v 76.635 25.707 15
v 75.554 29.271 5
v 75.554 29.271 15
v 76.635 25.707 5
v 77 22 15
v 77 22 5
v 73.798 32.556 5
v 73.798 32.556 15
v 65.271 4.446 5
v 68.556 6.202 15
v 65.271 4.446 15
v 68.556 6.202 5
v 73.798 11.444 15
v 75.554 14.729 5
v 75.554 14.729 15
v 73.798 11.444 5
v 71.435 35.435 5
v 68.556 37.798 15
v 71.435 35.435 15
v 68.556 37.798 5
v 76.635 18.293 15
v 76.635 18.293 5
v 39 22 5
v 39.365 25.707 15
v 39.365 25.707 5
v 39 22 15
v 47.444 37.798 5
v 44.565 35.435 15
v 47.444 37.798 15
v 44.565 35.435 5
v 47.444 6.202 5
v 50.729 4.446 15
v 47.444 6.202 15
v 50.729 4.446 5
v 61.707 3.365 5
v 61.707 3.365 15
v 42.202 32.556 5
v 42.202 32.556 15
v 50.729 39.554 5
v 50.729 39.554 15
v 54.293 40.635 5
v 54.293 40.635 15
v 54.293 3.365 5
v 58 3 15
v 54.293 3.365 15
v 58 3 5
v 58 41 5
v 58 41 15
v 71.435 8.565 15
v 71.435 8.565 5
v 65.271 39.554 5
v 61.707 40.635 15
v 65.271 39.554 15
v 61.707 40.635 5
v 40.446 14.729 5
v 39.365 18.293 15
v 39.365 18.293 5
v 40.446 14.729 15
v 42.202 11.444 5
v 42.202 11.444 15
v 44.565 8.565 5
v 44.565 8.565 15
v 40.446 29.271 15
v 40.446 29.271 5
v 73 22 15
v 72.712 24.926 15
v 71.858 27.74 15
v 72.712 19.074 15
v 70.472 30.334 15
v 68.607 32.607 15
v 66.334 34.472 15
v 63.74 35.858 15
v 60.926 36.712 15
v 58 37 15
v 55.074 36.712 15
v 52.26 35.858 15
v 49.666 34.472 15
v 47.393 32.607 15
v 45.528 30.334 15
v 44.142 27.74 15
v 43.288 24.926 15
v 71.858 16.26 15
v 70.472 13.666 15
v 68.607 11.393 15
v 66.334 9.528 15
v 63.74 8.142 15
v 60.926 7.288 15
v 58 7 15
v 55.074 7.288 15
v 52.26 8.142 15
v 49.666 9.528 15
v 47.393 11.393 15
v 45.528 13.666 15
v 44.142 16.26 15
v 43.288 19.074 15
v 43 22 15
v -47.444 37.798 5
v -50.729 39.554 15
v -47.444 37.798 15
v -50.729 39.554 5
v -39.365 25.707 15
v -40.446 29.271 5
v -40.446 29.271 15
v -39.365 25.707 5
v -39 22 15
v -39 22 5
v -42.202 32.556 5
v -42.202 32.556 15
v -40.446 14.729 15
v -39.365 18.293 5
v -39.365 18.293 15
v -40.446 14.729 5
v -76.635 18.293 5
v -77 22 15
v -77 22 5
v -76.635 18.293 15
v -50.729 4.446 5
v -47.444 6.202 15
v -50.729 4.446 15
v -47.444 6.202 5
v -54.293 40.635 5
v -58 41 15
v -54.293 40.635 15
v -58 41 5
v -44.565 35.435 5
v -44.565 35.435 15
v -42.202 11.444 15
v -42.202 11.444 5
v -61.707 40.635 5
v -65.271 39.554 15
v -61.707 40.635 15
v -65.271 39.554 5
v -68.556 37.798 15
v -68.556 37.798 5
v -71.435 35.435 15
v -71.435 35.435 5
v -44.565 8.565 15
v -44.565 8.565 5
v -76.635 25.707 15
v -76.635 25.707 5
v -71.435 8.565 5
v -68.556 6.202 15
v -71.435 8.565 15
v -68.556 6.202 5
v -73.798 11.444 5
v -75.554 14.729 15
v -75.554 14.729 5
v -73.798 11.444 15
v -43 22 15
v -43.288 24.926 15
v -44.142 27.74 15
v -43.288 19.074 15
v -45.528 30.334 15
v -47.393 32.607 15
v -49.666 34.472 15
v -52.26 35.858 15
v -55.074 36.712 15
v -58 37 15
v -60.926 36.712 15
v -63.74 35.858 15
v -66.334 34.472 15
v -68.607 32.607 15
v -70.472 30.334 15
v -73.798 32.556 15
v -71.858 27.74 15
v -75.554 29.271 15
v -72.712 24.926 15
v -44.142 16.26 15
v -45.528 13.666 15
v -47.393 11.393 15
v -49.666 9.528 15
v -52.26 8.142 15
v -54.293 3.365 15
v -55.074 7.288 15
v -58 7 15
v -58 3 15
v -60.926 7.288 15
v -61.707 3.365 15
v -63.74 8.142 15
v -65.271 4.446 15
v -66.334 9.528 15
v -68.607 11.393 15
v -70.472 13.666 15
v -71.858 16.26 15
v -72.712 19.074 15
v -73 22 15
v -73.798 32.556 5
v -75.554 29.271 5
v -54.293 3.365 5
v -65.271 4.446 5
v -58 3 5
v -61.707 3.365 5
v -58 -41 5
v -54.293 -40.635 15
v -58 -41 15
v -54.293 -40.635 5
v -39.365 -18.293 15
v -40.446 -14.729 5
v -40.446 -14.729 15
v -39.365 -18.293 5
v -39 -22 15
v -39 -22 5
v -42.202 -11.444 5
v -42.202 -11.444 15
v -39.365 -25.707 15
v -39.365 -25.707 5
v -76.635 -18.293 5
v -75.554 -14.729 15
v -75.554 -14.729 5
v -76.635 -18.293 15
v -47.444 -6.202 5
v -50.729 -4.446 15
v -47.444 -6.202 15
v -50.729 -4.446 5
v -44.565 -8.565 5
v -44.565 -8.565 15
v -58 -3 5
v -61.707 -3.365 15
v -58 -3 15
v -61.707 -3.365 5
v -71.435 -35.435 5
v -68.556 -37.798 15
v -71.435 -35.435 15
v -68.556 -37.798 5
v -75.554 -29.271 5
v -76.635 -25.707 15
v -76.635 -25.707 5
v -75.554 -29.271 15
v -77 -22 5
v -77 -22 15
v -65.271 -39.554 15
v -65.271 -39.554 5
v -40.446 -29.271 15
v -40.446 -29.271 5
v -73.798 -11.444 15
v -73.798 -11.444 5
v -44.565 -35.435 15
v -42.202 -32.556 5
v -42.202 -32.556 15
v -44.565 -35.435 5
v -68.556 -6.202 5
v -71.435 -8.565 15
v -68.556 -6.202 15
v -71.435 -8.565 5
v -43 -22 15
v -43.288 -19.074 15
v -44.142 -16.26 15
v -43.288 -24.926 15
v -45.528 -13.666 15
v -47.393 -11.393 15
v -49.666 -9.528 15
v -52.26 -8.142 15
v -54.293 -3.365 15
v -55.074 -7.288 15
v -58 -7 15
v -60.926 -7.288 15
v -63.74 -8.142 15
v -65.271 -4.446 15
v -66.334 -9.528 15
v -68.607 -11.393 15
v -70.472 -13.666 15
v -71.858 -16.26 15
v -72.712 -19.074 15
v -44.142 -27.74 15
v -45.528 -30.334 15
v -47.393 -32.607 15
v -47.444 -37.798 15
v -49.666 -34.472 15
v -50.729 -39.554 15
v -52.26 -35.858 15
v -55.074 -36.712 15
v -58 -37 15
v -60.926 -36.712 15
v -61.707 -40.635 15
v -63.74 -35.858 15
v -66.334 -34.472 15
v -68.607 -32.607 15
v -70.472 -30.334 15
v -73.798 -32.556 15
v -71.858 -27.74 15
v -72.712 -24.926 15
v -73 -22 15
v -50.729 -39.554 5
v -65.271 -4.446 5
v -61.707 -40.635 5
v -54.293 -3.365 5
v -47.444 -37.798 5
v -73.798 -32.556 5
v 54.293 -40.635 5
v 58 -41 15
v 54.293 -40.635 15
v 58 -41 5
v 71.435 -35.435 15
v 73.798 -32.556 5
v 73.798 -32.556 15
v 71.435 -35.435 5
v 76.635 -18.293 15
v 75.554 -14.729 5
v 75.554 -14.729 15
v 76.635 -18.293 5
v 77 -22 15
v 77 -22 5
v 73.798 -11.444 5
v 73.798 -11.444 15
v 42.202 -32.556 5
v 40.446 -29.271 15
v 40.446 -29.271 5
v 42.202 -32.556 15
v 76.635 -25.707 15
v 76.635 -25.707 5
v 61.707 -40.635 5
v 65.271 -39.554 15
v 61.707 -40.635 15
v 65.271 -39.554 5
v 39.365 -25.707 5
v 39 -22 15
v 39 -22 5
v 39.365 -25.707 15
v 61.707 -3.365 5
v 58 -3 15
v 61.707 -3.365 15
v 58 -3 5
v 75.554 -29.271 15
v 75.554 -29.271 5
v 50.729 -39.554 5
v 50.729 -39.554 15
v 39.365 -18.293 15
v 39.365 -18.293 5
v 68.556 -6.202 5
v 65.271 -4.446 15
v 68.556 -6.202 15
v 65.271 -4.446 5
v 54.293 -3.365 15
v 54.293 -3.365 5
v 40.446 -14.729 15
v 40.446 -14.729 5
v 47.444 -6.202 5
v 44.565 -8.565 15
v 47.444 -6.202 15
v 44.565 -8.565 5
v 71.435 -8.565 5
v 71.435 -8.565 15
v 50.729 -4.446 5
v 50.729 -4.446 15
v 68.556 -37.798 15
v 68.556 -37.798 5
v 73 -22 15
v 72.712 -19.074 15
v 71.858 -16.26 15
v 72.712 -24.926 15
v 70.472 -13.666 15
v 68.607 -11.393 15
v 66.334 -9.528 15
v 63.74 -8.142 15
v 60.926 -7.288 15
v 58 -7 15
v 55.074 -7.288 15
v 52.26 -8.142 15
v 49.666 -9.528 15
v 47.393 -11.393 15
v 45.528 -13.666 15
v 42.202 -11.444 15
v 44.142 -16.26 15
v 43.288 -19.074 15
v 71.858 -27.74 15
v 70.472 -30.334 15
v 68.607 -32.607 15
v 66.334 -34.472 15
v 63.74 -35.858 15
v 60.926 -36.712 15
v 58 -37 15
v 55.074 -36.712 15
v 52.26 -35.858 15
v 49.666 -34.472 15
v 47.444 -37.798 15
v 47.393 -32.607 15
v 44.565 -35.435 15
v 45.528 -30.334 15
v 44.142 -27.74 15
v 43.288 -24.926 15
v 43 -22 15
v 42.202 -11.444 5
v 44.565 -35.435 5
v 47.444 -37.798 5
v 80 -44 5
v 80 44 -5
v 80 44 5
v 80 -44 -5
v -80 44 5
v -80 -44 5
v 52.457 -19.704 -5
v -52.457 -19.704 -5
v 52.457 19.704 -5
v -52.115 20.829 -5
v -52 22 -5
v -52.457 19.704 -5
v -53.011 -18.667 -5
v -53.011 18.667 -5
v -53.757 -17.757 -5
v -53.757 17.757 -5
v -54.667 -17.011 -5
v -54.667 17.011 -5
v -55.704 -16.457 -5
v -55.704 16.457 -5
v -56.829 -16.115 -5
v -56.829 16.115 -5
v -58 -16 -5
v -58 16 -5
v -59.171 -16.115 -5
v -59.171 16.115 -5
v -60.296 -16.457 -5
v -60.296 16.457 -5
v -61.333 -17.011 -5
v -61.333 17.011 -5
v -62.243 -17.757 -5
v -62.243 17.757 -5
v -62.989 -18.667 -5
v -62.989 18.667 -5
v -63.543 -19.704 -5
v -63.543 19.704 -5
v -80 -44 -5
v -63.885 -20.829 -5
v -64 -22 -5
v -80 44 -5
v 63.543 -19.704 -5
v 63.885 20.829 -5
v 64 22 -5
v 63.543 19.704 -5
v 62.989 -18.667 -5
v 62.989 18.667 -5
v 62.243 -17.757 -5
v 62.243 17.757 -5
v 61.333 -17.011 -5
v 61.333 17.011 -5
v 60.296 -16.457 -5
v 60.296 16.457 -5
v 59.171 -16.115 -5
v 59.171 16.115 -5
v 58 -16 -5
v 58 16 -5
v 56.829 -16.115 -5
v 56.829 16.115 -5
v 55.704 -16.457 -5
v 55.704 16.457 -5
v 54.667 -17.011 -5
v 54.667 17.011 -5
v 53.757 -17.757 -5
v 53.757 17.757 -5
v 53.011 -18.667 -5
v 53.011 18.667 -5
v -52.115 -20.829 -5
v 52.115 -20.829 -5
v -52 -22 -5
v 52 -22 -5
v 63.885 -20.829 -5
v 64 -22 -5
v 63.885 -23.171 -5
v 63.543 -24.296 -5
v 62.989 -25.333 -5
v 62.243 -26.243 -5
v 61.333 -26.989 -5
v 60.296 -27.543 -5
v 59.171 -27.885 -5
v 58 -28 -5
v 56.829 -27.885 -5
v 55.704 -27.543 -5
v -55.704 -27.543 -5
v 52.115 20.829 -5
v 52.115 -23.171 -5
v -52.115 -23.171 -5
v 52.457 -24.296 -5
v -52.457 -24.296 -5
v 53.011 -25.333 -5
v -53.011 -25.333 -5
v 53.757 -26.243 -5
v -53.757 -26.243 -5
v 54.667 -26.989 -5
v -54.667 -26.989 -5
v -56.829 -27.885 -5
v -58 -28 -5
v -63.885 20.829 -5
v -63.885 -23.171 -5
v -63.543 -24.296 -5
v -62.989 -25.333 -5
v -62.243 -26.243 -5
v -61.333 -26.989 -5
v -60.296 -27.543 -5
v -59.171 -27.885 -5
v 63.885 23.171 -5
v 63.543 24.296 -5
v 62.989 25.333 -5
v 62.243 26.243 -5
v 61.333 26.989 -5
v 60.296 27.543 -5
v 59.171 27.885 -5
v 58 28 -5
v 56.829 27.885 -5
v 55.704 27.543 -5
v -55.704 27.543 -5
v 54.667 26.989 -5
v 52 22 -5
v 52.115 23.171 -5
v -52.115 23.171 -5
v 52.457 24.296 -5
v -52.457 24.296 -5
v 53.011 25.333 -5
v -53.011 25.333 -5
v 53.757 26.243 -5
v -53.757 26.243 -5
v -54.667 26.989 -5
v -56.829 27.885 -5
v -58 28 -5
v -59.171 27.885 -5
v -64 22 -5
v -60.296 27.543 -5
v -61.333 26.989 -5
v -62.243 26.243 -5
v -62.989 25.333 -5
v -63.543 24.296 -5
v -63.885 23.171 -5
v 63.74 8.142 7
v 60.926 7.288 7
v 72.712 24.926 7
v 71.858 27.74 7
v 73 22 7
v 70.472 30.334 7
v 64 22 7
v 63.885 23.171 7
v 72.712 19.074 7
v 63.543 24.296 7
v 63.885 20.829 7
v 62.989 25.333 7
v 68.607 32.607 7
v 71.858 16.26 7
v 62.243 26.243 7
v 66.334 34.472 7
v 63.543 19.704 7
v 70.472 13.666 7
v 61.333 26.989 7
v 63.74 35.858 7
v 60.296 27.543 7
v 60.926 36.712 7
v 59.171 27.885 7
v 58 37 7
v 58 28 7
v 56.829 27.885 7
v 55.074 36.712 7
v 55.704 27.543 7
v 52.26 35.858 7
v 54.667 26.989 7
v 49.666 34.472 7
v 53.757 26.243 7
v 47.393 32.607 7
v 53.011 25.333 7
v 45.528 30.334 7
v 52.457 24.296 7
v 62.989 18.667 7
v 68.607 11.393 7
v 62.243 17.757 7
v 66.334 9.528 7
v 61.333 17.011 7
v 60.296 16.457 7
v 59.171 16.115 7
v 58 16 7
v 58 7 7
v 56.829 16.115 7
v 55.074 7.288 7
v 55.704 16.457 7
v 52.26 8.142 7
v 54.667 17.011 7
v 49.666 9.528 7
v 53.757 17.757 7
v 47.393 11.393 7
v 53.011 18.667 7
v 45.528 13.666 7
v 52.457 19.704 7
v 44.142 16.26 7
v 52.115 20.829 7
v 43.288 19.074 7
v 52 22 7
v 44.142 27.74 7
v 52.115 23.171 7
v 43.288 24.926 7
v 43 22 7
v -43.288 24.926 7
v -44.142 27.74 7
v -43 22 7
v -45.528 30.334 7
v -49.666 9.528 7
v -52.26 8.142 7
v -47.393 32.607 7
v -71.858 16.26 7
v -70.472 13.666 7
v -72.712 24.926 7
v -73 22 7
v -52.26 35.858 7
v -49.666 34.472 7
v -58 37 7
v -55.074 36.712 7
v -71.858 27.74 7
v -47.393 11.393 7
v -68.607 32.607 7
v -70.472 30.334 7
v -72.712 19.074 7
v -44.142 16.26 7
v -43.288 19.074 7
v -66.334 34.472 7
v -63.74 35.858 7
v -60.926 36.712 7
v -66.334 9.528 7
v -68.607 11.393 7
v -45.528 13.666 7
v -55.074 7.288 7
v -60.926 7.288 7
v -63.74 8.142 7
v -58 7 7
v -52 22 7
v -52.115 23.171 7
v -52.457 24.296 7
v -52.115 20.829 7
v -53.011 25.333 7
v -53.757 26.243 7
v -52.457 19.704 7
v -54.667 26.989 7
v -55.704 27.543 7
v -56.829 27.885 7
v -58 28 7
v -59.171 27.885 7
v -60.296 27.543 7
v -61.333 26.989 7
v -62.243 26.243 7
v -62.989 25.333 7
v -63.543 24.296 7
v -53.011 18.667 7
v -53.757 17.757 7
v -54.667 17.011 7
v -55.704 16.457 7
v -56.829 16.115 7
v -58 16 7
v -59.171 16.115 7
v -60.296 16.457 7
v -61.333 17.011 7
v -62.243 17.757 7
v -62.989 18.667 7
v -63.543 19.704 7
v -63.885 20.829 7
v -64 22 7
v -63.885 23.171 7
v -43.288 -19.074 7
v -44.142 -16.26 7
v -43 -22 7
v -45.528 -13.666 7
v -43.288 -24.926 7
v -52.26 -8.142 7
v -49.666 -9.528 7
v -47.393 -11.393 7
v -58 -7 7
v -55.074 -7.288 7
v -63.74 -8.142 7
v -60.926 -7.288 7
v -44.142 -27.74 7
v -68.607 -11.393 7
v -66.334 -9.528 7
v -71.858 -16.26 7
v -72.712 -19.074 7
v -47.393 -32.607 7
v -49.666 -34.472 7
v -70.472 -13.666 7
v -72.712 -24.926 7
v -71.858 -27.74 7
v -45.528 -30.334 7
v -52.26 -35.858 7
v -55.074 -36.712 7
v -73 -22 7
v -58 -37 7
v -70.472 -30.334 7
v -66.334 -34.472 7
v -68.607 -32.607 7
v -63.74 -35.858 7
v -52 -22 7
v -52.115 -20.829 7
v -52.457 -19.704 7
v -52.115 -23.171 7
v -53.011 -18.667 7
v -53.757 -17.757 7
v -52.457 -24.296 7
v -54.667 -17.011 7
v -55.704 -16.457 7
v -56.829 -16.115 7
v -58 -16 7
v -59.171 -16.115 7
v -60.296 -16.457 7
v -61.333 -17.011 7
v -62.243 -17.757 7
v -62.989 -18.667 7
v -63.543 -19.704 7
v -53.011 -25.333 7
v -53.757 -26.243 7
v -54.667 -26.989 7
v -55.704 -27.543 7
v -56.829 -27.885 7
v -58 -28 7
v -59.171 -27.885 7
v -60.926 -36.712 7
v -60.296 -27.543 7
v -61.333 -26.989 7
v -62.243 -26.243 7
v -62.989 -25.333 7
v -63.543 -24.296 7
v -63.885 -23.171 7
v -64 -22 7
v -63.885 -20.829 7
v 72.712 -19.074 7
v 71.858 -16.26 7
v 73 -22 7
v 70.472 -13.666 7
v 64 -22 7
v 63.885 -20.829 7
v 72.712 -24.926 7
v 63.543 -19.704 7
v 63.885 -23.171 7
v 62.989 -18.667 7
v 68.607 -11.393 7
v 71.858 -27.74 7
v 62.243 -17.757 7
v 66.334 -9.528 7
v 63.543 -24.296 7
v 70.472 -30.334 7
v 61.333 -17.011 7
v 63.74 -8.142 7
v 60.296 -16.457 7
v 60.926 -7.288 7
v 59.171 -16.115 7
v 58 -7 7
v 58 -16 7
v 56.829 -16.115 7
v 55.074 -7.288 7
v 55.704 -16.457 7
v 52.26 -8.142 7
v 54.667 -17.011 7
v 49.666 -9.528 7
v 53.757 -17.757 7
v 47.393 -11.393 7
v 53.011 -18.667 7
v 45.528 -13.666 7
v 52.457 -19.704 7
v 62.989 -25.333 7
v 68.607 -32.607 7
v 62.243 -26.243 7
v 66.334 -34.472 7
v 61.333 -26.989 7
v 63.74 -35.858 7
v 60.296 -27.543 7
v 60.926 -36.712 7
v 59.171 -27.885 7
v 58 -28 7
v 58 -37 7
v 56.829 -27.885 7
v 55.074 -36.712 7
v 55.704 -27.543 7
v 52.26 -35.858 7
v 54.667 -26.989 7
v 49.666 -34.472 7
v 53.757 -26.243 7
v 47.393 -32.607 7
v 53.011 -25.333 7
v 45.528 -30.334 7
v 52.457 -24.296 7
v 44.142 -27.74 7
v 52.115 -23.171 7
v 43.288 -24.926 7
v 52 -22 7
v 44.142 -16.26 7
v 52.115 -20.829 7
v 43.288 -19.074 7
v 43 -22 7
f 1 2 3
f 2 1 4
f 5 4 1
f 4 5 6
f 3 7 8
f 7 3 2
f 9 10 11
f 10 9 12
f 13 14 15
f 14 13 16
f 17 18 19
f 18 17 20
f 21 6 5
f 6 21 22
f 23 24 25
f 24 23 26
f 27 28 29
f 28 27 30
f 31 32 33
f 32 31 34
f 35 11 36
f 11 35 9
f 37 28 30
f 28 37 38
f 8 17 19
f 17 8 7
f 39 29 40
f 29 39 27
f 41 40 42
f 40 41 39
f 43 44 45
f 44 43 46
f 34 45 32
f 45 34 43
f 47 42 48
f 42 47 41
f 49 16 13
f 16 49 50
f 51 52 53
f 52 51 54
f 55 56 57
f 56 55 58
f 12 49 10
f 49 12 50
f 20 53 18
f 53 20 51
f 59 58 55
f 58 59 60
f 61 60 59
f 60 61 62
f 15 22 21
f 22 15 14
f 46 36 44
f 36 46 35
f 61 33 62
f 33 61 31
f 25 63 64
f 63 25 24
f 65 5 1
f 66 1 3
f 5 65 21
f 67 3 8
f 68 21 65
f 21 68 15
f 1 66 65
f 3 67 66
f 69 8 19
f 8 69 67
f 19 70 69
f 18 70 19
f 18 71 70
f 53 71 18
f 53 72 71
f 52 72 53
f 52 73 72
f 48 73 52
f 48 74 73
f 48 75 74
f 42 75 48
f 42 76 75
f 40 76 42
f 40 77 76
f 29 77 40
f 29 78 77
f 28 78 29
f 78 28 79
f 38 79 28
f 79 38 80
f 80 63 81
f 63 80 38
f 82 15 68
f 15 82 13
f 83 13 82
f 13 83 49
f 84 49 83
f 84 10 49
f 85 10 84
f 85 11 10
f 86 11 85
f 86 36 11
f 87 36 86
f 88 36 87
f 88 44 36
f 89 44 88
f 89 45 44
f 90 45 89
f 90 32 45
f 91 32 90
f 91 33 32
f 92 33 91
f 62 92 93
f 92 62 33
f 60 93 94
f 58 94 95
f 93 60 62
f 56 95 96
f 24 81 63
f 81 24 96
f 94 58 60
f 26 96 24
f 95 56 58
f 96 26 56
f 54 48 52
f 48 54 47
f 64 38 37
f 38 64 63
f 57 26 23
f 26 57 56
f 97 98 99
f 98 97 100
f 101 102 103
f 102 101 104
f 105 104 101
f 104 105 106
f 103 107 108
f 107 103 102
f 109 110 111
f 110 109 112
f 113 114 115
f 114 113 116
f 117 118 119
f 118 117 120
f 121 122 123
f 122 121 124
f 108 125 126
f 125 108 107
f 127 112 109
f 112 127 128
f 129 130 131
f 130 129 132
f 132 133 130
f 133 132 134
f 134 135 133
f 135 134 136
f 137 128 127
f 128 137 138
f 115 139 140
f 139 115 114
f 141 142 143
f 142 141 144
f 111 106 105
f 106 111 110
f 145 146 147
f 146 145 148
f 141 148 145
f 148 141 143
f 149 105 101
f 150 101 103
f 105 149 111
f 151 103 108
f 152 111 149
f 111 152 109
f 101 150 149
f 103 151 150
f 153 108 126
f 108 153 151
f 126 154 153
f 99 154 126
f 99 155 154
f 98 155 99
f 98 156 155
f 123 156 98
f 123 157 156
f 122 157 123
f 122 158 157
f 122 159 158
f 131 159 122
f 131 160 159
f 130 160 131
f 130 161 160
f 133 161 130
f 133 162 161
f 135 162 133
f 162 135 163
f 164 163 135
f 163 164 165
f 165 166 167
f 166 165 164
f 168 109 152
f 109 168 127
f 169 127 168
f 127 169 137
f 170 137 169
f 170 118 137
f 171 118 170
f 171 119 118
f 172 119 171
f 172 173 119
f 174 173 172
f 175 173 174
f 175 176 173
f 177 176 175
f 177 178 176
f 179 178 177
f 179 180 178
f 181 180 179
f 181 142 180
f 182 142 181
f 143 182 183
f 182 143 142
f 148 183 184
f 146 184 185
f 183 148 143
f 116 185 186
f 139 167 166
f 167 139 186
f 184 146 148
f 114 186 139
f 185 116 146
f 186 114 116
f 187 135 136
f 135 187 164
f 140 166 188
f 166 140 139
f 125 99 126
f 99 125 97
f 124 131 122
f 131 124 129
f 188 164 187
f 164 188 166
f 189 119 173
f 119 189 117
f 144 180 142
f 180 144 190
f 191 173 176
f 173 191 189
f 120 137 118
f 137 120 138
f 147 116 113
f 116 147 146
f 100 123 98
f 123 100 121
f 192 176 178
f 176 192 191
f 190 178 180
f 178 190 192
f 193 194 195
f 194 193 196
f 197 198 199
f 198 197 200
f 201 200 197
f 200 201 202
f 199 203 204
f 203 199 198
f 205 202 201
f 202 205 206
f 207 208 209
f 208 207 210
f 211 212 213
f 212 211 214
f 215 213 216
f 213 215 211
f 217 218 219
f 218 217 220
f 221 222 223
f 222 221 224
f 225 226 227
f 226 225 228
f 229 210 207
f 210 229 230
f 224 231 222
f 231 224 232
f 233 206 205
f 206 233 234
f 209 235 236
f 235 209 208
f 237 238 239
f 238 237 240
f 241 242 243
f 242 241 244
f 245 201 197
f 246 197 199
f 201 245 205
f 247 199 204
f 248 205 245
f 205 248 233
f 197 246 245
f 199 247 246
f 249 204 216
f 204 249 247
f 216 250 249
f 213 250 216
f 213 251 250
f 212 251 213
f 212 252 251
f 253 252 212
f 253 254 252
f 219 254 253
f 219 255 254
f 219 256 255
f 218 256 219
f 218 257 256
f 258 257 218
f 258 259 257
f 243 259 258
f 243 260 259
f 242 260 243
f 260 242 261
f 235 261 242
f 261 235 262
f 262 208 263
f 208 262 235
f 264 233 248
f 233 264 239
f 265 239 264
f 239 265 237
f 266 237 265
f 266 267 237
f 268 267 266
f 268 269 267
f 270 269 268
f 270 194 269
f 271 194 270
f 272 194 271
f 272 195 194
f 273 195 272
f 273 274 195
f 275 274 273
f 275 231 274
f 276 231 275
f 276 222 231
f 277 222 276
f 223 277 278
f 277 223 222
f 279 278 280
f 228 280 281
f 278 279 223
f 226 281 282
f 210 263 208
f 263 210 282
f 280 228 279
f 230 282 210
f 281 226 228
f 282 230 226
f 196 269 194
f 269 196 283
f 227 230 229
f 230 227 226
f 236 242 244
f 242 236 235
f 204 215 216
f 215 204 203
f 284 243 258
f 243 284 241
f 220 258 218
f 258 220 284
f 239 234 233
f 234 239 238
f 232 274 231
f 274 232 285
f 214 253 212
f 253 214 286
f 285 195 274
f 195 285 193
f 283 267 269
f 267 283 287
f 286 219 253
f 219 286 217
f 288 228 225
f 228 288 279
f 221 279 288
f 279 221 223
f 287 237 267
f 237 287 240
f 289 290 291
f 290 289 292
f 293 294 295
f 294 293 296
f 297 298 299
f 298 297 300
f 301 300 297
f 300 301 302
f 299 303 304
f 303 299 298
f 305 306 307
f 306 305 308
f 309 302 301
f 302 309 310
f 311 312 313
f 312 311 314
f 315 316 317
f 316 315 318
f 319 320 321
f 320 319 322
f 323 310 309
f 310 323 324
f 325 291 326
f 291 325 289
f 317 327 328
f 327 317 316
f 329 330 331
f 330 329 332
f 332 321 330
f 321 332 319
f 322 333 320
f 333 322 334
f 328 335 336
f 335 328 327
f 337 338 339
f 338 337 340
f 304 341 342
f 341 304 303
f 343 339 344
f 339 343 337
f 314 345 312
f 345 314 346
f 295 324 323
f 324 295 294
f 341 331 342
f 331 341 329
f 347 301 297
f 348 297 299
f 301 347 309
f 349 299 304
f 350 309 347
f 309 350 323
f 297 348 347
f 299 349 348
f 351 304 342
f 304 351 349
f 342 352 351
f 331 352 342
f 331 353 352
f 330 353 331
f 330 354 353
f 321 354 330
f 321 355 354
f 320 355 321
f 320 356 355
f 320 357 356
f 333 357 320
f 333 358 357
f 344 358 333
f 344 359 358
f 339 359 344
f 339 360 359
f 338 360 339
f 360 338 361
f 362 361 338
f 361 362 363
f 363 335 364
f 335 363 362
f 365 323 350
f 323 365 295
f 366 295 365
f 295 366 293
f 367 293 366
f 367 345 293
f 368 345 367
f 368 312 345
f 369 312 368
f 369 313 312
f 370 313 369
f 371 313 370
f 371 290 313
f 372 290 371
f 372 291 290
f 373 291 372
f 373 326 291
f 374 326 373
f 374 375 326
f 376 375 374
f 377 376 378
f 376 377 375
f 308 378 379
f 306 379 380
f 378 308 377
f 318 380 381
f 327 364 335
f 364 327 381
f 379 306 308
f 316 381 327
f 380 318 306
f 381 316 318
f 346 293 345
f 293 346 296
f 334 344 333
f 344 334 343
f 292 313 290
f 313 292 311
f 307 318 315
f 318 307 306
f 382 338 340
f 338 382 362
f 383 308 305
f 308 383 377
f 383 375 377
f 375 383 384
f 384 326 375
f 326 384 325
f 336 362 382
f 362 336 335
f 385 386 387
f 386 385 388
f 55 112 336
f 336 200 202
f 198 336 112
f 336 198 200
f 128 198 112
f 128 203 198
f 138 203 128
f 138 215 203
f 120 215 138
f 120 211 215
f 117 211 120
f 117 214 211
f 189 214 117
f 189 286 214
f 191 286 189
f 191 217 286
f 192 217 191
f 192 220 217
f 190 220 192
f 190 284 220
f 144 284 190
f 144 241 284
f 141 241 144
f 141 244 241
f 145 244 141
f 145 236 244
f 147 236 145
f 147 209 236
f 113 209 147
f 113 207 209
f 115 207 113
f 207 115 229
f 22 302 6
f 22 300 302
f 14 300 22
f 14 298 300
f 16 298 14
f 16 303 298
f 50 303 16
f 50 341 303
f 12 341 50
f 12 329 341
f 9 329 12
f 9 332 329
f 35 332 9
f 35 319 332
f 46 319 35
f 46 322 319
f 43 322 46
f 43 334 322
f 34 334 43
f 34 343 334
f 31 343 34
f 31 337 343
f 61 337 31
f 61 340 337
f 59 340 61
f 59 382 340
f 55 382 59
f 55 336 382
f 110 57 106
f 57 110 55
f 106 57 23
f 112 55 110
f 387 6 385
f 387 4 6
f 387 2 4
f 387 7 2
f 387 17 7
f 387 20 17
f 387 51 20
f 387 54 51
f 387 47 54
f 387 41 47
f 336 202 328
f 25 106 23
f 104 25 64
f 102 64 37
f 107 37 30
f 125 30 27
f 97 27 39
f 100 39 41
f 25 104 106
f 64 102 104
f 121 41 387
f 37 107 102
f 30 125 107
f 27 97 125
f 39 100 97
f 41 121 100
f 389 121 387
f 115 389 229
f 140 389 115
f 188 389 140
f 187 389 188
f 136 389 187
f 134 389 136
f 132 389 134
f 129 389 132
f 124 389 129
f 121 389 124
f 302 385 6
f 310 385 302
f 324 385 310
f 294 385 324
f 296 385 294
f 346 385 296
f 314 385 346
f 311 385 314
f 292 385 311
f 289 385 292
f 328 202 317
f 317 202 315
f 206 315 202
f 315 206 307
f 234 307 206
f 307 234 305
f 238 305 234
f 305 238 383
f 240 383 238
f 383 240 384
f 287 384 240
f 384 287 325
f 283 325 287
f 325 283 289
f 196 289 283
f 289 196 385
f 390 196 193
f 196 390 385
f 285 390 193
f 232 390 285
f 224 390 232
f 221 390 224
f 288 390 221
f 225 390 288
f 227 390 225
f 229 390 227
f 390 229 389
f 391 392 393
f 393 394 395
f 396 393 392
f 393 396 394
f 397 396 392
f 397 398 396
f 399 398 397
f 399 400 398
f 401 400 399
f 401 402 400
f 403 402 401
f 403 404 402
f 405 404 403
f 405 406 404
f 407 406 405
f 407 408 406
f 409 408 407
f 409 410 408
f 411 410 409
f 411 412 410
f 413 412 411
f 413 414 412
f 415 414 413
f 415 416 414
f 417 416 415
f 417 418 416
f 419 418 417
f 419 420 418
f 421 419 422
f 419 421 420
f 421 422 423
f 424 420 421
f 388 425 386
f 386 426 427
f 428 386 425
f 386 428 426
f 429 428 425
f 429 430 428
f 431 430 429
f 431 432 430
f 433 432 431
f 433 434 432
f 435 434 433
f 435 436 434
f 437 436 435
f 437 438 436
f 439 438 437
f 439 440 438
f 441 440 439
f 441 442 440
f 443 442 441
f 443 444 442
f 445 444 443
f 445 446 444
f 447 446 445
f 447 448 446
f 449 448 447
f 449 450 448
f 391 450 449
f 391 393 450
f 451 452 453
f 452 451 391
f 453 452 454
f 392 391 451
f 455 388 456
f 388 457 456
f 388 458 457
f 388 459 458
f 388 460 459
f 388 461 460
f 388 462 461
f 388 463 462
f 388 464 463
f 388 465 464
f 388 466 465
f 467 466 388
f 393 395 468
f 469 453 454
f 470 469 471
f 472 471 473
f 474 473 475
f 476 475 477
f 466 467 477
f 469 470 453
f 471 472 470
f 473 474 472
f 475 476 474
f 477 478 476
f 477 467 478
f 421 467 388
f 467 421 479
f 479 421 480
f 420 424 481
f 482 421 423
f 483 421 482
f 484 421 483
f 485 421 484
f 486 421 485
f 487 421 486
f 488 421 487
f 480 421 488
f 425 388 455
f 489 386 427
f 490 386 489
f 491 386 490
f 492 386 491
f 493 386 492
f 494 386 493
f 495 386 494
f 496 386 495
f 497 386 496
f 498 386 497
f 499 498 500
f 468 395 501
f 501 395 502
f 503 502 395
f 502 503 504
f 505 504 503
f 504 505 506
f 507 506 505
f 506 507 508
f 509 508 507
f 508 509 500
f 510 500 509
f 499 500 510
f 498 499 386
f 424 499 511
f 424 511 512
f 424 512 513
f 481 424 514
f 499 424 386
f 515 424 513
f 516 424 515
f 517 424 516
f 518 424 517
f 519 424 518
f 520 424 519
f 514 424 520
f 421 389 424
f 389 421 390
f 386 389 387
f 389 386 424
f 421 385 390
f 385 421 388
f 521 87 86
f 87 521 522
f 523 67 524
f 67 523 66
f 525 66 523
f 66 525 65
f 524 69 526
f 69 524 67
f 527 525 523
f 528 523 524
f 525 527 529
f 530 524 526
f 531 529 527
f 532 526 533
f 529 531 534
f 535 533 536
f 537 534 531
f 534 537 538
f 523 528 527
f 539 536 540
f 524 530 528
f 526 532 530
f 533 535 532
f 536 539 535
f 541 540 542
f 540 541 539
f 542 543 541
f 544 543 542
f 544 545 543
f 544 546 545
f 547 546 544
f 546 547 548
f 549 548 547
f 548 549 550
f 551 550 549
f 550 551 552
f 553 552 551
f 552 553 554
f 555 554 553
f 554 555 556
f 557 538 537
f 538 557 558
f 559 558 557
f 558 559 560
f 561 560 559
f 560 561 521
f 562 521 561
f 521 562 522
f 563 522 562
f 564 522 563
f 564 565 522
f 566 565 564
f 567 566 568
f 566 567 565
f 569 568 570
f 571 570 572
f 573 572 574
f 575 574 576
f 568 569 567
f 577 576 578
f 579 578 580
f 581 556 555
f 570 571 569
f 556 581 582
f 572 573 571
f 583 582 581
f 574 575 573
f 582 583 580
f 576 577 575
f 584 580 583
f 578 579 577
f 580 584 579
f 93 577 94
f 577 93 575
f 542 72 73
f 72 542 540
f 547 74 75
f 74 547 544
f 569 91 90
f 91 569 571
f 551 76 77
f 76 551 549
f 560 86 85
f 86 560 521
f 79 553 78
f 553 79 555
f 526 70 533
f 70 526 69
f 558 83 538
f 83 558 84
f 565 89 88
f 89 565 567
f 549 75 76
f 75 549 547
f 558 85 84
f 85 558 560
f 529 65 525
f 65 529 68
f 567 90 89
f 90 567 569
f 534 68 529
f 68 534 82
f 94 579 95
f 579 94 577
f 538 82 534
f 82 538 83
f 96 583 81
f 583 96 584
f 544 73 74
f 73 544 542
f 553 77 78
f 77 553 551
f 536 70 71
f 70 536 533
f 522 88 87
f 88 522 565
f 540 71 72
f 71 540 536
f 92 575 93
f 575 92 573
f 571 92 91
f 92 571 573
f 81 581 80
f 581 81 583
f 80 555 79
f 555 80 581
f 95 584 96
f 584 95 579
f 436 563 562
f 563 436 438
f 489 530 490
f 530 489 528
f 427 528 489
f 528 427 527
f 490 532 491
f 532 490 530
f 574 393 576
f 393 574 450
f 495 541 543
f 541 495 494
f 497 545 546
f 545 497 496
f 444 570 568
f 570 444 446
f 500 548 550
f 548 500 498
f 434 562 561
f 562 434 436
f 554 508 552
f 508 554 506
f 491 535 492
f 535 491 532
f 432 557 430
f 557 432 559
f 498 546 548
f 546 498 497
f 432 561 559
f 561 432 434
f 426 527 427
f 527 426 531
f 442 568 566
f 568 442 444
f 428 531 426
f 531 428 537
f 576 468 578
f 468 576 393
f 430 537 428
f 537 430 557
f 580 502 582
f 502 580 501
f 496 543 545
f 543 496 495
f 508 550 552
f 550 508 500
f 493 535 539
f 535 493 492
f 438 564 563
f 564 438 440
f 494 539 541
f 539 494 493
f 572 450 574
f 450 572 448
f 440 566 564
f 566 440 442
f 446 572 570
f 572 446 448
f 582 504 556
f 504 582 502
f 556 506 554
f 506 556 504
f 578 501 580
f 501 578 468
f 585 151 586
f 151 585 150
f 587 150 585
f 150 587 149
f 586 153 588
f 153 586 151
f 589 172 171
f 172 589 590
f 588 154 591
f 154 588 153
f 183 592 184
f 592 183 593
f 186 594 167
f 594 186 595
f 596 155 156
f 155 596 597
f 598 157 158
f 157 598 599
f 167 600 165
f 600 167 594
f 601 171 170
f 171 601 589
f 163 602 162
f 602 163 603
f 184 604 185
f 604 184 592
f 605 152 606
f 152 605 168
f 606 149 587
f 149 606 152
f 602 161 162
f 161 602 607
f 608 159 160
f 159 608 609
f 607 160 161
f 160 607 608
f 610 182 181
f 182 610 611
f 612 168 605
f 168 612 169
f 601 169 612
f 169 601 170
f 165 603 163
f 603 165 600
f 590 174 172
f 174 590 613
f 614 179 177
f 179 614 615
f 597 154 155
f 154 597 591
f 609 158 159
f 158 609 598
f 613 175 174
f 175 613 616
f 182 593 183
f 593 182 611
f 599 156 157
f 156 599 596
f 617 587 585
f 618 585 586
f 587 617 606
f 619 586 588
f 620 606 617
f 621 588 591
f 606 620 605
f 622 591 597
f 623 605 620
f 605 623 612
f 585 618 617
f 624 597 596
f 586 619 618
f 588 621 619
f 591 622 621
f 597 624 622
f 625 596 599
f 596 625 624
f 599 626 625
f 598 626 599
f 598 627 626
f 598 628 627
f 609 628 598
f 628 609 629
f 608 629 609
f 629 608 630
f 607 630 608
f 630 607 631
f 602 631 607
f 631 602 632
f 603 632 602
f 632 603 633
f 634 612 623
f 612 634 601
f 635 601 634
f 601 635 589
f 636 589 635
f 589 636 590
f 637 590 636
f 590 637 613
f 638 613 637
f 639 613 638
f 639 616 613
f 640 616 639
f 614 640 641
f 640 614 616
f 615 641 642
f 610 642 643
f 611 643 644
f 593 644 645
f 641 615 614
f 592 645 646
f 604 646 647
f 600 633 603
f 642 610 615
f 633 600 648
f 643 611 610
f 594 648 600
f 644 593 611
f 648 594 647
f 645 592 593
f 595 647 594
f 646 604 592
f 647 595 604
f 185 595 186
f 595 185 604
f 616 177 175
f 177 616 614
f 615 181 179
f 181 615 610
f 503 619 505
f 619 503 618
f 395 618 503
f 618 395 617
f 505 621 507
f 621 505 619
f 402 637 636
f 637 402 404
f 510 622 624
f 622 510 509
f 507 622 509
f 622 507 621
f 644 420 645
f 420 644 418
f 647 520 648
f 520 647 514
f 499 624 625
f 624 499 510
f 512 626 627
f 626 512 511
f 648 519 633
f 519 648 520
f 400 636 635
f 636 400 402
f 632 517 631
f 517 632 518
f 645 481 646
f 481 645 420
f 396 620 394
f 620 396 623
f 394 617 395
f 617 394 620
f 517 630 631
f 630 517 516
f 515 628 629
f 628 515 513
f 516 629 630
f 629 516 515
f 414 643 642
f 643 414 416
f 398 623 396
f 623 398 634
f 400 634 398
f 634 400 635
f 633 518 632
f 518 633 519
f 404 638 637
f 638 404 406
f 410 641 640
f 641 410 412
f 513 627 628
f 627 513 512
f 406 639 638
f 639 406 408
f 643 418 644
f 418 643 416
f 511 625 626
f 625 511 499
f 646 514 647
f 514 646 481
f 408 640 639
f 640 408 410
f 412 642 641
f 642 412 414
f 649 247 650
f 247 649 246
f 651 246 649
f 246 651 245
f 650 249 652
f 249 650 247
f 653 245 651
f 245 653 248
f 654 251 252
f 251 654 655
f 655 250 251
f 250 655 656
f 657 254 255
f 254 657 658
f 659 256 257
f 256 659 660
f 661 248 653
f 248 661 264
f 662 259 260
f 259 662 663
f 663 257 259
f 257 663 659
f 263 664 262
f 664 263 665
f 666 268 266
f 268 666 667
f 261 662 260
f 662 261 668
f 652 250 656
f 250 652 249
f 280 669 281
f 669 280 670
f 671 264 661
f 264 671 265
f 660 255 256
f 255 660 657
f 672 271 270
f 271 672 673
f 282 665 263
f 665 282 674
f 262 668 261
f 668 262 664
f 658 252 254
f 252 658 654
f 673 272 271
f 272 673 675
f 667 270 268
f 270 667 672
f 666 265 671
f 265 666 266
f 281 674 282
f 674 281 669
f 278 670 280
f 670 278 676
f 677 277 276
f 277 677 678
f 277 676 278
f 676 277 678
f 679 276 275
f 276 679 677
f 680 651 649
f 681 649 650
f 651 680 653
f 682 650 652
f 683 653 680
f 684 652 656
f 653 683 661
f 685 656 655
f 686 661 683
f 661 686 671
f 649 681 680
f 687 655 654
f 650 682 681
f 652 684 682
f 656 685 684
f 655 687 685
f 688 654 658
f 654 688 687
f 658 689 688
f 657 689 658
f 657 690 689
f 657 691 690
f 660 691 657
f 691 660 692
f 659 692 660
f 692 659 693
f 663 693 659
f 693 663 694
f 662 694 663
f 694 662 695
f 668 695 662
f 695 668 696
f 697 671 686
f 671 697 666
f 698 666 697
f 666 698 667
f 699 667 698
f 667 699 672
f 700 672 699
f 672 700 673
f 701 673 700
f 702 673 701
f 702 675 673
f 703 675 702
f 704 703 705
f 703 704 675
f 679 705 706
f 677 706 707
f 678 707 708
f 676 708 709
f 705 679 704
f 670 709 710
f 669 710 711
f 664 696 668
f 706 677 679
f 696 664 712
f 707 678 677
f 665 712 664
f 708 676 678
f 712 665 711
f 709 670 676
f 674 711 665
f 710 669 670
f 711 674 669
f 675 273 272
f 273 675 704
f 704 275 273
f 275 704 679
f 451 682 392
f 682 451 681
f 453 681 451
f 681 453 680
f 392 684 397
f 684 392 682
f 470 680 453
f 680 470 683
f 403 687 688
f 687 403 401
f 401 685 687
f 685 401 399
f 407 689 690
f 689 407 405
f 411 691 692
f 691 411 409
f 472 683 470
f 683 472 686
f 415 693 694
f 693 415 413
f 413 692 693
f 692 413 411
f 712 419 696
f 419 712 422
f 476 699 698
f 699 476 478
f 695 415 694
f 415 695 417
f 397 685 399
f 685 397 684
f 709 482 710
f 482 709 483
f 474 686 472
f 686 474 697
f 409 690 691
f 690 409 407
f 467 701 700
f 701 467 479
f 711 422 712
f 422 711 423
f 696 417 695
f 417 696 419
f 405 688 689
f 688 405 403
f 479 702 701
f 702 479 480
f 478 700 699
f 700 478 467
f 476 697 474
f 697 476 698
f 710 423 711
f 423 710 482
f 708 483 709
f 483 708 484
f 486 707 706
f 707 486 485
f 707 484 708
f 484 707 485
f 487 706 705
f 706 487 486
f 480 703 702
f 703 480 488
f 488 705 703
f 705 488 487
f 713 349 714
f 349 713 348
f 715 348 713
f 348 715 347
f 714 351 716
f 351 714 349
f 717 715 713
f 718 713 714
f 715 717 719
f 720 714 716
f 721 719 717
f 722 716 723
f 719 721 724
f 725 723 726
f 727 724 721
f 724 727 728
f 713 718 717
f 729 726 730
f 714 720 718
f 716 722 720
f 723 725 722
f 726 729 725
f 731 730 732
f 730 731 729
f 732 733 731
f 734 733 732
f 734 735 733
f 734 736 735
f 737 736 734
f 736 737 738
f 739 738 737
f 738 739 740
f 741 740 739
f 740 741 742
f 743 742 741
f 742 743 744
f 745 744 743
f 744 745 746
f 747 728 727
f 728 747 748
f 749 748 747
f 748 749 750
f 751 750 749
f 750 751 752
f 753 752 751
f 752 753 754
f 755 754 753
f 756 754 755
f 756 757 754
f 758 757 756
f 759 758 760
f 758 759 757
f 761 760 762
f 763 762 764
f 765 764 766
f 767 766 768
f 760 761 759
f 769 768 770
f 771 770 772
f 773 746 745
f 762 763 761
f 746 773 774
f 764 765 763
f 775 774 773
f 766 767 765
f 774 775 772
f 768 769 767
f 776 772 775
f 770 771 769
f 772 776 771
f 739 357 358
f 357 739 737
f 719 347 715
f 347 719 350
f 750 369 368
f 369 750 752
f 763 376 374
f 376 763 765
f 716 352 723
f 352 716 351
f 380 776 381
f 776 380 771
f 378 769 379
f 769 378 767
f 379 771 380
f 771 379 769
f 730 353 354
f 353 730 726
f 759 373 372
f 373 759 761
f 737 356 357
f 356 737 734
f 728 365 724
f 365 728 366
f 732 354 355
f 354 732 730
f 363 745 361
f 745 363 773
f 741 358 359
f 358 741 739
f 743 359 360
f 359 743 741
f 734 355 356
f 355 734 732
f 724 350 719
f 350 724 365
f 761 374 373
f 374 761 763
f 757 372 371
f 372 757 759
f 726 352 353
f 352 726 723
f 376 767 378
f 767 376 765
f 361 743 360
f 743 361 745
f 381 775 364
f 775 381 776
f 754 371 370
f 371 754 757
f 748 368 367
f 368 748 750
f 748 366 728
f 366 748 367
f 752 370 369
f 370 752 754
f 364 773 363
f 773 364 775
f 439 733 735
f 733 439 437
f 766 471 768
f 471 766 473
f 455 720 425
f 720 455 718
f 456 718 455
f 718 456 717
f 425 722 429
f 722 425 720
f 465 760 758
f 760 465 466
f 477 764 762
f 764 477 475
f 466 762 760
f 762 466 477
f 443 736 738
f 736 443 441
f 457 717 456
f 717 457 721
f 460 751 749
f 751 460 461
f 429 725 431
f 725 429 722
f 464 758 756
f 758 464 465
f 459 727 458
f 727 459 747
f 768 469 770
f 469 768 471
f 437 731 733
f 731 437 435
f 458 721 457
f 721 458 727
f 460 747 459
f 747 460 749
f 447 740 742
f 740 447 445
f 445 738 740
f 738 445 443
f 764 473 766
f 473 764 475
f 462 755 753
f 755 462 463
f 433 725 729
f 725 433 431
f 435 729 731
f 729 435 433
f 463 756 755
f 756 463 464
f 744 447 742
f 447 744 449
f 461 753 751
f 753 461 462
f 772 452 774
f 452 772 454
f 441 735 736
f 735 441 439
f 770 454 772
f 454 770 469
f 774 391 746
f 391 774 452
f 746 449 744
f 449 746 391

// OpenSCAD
$fn = 32;

// ----------------------------------------------------------------------
// Socket pad plate
// bosses with counterbored sockets for the screws
// ----------------------------------------------------------------------

// --- parameters (mm) ---
base_t = 10;            // base plate thickness
boss_h = 10;            // boss height above the base plate
boss_d = 38;            // boss diameter
socket_d = 30;          // socket diameter
socket_depth = 8;       // socket depth from the boss face
bolt_d = 12;            // screw clearance hole through the socket floor
plate = [160, 88, 10];  // overall size (x, y, z)
edge = 22;              // boss centre offset from the plate edge
pads = 4;               // boss count, one per corner

// --- derived feature positions (mm) ---
height = base_t + boss_h;        // = 20   overall height of the part
corner_x = plate[0] / 2 - edge;  // = 58   boss centre X
corner_y = plate[1] / 2 - edge;  // = 22   boss centre Y
feature_centers = [
  [corner_x, corner_y],
  [-corner_x, corner_y],
  [-corner_x, -corner_y],
  [corner_x, -corner_y]
];   // boss centres: sockets, holes and the pads themselves are placed from here

// base plate, bosses on feature_centers, socket + through hole in each
difference() {
  union() {
    cube(plate, center = true);
    for (centre = feature_centers)
      translate([centre[0], centre[1], plate[2] / 2 - 1])
        cylinder(d = boss_d, h = boss_h + 1);
  }
  for (centre = feature_centers) {
    translate([centre[0], centre[1], plate[2] / 2 + boss_h - socket_depth])
      cylinder(d = socket_d, h = socket_depth + 1);
    translate([centre[0], centre[1], -height])
      cylinder(d = bolt_d, h = 2 * height + 2);  // through the socket floor
  }
}
